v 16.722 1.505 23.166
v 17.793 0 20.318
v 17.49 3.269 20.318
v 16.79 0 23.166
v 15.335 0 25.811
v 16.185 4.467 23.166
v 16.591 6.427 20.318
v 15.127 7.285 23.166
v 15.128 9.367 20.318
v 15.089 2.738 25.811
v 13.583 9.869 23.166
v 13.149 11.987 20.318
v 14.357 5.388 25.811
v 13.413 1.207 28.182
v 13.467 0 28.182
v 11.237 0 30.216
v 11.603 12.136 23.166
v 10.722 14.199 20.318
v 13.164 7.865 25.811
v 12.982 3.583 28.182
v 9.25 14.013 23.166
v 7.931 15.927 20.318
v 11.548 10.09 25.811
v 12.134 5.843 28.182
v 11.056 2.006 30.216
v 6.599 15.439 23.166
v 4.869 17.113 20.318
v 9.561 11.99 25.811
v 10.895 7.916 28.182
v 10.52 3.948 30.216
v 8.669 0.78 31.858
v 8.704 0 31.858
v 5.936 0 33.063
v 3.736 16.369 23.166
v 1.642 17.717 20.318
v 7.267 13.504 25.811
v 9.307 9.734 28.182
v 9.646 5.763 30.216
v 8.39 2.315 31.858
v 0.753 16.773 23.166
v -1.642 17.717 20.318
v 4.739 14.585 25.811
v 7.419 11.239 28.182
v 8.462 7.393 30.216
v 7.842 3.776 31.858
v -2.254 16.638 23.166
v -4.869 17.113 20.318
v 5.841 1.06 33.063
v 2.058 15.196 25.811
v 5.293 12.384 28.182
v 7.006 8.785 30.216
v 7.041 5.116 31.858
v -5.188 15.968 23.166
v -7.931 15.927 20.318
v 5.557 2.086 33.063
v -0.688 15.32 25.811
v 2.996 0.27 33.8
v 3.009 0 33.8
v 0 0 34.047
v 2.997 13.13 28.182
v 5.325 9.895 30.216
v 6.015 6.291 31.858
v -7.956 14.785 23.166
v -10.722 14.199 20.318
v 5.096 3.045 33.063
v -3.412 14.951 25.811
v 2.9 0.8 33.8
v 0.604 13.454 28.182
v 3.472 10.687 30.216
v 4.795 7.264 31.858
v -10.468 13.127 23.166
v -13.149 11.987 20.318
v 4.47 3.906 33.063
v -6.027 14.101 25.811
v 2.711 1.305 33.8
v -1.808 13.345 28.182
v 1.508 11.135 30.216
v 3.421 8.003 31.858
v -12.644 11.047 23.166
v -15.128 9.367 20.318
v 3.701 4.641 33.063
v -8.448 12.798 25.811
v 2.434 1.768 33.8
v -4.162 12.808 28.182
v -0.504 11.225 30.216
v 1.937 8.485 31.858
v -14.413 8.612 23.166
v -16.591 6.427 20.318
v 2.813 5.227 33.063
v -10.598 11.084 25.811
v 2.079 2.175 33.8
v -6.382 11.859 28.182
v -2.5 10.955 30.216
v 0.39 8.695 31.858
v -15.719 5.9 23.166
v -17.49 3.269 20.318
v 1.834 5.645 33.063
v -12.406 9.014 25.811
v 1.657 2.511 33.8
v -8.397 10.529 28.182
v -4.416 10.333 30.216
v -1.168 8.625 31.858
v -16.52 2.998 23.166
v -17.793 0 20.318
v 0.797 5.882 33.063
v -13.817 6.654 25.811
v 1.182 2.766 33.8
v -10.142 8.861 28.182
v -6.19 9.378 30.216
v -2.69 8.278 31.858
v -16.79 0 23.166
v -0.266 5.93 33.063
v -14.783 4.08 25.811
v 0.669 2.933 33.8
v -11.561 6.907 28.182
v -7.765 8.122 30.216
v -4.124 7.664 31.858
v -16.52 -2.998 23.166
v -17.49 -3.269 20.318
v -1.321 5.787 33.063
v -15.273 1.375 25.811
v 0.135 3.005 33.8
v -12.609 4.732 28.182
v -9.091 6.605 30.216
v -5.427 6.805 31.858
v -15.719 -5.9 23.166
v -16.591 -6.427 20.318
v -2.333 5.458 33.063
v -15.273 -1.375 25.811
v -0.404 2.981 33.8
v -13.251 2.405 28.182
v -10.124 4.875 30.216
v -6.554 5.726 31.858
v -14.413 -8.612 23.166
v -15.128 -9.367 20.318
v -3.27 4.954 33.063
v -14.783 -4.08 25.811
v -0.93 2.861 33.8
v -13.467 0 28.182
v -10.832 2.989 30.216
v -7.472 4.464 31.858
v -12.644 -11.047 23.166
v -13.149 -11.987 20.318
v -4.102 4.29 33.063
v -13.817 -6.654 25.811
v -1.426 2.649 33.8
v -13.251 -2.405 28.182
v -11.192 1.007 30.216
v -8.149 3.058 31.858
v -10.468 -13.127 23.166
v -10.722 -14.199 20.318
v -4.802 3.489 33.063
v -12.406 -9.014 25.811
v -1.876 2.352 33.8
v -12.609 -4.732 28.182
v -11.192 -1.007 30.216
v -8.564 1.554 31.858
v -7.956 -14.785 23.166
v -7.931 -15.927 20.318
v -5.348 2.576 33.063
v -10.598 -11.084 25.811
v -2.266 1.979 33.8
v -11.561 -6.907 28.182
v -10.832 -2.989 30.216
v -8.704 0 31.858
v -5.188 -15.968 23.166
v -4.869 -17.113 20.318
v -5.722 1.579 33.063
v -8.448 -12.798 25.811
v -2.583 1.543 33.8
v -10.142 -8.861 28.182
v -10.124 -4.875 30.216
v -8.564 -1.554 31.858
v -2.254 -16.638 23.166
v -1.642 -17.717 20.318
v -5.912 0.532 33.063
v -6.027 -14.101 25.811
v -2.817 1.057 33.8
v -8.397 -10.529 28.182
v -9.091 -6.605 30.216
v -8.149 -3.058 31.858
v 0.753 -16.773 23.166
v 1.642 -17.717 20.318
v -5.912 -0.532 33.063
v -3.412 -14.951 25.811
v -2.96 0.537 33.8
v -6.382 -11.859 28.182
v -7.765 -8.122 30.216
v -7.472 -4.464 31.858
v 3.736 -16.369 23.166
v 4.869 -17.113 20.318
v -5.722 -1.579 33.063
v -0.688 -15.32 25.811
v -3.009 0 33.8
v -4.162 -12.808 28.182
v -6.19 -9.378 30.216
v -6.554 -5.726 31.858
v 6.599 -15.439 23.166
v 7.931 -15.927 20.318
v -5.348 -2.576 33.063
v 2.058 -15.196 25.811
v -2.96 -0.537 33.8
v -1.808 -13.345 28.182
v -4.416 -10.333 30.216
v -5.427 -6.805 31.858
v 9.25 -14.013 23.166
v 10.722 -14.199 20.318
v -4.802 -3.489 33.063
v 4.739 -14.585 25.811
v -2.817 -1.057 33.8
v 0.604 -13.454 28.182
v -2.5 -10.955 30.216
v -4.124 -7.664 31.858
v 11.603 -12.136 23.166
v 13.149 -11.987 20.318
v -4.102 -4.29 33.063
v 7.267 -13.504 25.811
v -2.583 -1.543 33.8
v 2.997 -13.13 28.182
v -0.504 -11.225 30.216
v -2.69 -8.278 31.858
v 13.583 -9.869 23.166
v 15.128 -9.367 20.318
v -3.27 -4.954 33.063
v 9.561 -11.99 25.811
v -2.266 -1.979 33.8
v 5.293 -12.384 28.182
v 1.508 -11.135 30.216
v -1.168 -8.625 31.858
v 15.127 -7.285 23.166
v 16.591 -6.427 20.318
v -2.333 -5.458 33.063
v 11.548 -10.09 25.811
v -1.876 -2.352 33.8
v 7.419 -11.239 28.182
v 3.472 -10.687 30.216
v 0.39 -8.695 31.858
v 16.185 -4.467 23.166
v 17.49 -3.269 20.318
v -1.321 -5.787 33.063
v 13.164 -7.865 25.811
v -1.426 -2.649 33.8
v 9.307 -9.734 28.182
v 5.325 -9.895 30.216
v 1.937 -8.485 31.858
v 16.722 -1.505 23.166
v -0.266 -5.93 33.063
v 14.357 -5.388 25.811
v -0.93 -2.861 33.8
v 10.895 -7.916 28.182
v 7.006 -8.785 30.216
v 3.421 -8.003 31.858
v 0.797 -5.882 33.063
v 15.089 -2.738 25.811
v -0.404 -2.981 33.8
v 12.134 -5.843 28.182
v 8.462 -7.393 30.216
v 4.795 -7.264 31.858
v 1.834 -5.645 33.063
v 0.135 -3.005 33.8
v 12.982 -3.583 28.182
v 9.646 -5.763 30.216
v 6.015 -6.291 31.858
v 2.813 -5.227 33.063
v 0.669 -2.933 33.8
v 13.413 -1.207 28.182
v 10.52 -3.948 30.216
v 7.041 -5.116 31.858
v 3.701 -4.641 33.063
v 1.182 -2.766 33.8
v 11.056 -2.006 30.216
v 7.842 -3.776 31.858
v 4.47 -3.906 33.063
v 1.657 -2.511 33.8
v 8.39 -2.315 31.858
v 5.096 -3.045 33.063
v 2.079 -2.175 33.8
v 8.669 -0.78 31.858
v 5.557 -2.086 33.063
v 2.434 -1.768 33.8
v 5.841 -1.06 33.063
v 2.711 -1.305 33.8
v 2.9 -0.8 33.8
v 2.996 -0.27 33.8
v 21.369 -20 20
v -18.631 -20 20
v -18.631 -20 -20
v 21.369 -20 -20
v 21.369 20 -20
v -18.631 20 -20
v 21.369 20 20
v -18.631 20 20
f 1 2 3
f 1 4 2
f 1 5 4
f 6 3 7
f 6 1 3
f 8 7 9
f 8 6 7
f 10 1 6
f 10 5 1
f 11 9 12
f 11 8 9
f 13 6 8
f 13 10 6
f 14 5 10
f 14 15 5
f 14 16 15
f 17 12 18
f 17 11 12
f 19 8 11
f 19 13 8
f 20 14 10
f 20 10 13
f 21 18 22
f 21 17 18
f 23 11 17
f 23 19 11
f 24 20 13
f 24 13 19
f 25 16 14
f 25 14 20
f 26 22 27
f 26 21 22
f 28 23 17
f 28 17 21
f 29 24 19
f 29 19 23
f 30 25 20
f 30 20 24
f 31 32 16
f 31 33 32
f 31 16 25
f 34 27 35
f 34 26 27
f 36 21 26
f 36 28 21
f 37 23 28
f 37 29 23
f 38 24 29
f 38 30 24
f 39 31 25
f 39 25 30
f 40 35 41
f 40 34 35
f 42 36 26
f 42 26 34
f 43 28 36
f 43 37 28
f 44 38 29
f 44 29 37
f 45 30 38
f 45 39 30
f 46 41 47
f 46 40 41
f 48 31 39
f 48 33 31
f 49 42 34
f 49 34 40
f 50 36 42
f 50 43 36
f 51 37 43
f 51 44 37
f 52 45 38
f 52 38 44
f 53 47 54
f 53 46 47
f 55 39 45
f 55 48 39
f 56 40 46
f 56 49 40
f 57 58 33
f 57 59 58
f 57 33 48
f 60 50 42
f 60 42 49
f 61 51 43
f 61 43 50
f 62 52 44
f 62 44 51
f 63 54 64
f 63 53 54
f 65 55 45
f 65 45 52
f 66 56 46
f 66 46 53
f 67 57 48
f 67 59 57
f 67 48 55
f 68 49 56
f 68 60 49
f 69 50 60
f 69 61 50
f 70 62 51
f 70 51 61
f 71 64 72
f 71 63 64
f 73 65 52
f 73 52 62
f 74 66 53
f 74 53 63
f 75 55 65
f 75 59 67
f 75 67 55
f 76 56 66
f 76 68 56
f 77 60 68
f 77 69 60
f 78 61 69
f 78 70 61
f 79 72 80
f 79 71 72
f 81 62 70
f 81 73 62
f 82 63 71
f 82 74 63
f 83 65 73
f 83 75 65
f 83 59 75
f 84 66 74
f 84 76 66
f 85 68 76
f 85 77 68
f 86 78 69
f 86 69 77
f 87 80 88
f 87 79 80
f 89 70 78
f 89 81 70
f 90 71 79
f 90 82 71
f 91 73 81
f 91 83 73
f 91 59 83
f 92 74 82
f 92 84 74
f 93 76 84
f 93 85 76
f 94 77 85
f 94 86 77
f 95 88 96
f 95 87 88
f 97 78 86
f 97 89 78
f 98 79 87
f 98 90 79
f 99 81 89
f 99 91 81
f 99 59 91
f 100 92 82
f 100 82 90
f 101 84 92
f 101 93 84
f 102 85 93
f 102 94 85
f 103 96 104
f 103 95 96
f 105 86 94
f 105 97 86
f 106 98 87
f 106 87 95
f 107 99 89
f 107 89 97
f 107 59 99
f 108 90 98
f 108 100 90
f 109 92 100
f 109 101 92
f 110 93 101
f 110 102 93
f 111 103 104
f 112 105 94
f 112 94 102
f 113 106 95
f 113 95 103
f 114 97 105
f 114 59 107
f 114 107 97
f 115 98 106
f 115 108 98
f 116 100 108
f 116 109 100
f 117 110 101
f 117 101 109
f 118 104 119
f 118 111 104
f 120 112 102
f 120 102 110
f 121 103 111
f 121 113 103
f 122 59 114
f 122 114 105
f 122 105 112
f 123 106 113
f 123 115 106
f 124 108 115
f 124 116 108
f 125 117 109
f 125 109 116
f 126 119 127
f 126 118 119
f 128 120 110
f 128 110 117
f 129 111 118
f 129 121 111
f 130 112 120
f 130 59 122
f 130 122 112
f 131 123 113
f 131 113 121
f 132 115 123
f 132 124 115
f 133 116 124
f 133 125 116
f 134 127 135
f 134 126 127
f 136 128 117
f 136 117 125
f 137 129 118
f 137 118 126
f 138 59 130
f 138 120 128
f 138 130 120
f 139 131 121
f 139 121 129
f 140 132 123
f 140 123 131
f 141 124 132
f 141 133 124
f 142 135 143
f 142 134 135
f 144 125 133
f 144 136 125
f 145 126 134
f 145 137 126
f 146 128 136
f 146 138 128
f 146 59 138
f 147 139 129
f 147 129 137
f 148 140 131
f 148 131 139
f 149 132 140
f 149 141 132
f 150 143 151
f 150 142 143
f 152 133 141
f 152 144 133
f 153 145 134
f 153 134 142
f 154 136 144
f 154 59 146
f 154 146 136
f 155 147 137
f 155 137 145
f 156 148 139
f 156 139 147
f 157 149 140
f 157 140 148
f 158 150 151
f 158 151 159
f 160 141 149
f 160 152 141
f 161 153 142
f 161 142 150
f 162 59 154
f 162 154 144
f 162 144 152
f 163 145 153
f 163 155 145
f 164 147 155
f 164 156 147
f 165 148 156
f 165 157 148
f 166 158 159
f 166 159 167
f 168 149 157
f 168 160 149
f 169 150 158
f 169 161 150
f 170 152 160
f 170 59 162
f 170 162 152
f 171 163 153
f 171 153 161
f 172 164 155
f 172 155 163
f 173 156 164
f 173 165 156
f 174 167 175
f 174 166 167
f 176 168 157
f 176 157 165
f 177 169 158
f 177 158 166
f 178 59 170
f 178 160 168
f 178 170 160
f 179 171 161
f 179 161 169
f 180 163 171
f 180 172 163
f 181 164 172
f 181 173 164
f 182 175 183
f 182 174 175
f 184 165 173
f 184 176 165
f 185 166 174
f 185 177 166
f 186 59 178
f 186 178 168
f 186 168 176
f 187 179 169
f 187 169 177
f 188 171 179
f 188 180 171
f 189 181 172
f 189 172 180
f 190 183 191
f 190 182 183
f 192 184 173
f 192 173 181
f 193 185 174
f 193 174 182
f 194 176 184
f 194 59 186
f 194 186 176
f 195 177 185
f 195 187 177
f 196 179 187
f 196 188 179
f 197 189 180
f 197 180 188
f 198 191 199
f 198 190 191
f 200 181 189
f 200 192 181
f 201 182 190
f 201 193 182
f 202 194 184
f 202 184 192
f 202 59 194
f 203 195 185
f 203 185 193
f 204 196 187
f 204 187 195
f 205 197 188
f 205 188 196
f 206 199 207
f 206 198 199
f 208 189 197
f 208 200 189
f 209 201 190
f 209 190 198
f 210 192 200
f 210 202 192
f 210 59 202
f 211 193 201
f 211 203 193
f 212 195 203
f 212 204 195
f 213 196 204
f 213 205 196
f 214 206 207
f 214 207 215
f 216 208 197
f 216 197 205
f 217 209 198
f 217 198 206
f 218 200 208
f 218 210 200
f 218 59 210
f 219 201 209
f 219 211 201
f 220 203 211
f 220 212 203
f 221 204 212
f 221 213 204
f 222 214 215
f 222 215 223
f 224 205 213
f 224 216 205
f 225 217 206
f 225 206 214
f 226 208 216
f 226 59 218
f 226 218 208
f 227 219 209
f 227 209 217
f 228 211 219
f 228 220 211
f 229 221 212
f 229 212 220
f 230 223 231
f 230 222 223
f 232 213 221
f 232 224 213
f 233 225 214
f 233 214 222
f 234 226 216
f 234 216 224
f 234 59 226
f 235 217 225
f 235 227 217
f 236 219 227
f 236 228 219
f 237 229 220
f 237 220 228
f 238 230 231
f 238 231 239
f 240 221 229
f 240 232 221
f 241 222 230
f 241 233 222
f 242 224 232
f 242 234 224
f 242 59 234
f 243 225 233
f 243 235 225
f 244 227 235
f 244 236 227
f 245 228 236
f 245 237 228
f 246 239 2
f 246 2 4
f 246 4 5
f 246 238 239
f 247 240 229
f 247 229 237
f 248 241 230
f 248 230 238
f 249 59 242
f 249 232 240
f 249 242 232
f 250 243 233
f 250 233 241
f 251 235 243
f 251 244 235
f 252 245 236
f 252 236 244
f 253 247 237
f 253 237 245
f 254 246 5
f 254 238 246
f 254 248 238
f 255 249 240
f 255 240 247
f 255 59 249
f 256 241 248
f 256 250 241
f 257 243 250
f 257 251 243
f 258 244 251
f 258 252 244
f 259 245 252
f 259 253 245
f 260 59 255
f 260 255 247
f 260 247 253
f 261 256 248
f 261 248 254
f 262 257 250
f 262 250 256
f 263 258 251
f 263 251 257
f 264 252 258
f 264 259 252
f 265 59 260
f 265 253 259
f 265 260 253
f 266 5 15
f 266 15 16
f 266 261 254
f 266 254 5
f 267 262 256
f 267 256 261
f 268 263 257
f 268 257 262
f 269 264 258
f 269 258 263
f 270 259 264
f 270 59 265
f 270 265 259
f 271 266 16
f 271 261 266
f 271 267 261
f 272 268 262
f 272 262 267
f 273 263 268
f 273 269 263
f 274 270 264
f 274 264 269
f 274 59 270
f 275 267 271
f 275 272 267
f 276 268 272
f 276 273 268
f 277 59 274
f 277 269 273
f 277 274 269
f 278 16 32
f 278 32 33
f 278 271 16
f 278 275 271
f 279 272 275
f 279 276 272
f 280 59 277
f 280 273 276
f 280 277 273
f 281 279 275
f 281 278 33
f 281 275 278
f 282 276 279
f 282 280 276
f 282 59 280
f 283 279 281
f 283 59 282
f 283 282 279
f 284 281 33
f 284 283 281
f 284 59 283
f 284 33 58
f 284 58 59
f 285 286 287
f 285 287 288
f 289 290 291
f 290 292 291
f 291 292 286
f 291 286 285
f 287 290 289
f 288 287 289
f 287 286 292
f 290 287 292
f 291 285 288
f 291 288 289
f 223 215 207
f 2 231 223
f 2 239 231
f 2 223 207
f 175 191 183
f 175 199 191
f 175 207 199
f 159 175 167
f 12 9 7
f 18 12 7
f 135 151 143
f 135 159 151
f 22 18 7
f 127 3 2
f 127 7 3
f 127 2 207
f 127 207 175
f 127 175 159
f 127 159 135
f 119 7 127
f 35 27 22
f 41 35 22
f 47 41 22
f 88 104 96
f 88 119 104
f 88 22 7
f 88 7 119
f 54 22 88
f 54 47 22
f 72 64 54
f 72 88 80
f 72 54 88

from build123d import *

# Parameters (mm, degrees)
F0_W     = 40
F0_H     = 40
F1_DEPTH = 20


with BuildPart() as f1:
    # F0 (on Top) → F1 (new body, symmetric)
    with BuildSketch(Plane.XY):
        with Locations((1.368772, 0)):
            Rectangle(F0_W, F0_H)
    extrude(amount=F1_DEPTH, both=True)


with BuildPart() as f4:
    # F3 (on Front) → F4 (revolve)
    with BuildSketch(Plane.XZ):
        with BuildLine():
            Line((0, 20.31834), (17.792672, 20.31834))
            ThreePointArc((17.792672, 20.31834), (11.236781, 30.216), (0, 34.047207))
            Line((0, 34.047207), (0, 20.31834))
        make_face()
    revolve(axis=Axis((0, 0, 8.158287), (0, 0, 1)))


solid = Compound([f1.part, f4.part])
